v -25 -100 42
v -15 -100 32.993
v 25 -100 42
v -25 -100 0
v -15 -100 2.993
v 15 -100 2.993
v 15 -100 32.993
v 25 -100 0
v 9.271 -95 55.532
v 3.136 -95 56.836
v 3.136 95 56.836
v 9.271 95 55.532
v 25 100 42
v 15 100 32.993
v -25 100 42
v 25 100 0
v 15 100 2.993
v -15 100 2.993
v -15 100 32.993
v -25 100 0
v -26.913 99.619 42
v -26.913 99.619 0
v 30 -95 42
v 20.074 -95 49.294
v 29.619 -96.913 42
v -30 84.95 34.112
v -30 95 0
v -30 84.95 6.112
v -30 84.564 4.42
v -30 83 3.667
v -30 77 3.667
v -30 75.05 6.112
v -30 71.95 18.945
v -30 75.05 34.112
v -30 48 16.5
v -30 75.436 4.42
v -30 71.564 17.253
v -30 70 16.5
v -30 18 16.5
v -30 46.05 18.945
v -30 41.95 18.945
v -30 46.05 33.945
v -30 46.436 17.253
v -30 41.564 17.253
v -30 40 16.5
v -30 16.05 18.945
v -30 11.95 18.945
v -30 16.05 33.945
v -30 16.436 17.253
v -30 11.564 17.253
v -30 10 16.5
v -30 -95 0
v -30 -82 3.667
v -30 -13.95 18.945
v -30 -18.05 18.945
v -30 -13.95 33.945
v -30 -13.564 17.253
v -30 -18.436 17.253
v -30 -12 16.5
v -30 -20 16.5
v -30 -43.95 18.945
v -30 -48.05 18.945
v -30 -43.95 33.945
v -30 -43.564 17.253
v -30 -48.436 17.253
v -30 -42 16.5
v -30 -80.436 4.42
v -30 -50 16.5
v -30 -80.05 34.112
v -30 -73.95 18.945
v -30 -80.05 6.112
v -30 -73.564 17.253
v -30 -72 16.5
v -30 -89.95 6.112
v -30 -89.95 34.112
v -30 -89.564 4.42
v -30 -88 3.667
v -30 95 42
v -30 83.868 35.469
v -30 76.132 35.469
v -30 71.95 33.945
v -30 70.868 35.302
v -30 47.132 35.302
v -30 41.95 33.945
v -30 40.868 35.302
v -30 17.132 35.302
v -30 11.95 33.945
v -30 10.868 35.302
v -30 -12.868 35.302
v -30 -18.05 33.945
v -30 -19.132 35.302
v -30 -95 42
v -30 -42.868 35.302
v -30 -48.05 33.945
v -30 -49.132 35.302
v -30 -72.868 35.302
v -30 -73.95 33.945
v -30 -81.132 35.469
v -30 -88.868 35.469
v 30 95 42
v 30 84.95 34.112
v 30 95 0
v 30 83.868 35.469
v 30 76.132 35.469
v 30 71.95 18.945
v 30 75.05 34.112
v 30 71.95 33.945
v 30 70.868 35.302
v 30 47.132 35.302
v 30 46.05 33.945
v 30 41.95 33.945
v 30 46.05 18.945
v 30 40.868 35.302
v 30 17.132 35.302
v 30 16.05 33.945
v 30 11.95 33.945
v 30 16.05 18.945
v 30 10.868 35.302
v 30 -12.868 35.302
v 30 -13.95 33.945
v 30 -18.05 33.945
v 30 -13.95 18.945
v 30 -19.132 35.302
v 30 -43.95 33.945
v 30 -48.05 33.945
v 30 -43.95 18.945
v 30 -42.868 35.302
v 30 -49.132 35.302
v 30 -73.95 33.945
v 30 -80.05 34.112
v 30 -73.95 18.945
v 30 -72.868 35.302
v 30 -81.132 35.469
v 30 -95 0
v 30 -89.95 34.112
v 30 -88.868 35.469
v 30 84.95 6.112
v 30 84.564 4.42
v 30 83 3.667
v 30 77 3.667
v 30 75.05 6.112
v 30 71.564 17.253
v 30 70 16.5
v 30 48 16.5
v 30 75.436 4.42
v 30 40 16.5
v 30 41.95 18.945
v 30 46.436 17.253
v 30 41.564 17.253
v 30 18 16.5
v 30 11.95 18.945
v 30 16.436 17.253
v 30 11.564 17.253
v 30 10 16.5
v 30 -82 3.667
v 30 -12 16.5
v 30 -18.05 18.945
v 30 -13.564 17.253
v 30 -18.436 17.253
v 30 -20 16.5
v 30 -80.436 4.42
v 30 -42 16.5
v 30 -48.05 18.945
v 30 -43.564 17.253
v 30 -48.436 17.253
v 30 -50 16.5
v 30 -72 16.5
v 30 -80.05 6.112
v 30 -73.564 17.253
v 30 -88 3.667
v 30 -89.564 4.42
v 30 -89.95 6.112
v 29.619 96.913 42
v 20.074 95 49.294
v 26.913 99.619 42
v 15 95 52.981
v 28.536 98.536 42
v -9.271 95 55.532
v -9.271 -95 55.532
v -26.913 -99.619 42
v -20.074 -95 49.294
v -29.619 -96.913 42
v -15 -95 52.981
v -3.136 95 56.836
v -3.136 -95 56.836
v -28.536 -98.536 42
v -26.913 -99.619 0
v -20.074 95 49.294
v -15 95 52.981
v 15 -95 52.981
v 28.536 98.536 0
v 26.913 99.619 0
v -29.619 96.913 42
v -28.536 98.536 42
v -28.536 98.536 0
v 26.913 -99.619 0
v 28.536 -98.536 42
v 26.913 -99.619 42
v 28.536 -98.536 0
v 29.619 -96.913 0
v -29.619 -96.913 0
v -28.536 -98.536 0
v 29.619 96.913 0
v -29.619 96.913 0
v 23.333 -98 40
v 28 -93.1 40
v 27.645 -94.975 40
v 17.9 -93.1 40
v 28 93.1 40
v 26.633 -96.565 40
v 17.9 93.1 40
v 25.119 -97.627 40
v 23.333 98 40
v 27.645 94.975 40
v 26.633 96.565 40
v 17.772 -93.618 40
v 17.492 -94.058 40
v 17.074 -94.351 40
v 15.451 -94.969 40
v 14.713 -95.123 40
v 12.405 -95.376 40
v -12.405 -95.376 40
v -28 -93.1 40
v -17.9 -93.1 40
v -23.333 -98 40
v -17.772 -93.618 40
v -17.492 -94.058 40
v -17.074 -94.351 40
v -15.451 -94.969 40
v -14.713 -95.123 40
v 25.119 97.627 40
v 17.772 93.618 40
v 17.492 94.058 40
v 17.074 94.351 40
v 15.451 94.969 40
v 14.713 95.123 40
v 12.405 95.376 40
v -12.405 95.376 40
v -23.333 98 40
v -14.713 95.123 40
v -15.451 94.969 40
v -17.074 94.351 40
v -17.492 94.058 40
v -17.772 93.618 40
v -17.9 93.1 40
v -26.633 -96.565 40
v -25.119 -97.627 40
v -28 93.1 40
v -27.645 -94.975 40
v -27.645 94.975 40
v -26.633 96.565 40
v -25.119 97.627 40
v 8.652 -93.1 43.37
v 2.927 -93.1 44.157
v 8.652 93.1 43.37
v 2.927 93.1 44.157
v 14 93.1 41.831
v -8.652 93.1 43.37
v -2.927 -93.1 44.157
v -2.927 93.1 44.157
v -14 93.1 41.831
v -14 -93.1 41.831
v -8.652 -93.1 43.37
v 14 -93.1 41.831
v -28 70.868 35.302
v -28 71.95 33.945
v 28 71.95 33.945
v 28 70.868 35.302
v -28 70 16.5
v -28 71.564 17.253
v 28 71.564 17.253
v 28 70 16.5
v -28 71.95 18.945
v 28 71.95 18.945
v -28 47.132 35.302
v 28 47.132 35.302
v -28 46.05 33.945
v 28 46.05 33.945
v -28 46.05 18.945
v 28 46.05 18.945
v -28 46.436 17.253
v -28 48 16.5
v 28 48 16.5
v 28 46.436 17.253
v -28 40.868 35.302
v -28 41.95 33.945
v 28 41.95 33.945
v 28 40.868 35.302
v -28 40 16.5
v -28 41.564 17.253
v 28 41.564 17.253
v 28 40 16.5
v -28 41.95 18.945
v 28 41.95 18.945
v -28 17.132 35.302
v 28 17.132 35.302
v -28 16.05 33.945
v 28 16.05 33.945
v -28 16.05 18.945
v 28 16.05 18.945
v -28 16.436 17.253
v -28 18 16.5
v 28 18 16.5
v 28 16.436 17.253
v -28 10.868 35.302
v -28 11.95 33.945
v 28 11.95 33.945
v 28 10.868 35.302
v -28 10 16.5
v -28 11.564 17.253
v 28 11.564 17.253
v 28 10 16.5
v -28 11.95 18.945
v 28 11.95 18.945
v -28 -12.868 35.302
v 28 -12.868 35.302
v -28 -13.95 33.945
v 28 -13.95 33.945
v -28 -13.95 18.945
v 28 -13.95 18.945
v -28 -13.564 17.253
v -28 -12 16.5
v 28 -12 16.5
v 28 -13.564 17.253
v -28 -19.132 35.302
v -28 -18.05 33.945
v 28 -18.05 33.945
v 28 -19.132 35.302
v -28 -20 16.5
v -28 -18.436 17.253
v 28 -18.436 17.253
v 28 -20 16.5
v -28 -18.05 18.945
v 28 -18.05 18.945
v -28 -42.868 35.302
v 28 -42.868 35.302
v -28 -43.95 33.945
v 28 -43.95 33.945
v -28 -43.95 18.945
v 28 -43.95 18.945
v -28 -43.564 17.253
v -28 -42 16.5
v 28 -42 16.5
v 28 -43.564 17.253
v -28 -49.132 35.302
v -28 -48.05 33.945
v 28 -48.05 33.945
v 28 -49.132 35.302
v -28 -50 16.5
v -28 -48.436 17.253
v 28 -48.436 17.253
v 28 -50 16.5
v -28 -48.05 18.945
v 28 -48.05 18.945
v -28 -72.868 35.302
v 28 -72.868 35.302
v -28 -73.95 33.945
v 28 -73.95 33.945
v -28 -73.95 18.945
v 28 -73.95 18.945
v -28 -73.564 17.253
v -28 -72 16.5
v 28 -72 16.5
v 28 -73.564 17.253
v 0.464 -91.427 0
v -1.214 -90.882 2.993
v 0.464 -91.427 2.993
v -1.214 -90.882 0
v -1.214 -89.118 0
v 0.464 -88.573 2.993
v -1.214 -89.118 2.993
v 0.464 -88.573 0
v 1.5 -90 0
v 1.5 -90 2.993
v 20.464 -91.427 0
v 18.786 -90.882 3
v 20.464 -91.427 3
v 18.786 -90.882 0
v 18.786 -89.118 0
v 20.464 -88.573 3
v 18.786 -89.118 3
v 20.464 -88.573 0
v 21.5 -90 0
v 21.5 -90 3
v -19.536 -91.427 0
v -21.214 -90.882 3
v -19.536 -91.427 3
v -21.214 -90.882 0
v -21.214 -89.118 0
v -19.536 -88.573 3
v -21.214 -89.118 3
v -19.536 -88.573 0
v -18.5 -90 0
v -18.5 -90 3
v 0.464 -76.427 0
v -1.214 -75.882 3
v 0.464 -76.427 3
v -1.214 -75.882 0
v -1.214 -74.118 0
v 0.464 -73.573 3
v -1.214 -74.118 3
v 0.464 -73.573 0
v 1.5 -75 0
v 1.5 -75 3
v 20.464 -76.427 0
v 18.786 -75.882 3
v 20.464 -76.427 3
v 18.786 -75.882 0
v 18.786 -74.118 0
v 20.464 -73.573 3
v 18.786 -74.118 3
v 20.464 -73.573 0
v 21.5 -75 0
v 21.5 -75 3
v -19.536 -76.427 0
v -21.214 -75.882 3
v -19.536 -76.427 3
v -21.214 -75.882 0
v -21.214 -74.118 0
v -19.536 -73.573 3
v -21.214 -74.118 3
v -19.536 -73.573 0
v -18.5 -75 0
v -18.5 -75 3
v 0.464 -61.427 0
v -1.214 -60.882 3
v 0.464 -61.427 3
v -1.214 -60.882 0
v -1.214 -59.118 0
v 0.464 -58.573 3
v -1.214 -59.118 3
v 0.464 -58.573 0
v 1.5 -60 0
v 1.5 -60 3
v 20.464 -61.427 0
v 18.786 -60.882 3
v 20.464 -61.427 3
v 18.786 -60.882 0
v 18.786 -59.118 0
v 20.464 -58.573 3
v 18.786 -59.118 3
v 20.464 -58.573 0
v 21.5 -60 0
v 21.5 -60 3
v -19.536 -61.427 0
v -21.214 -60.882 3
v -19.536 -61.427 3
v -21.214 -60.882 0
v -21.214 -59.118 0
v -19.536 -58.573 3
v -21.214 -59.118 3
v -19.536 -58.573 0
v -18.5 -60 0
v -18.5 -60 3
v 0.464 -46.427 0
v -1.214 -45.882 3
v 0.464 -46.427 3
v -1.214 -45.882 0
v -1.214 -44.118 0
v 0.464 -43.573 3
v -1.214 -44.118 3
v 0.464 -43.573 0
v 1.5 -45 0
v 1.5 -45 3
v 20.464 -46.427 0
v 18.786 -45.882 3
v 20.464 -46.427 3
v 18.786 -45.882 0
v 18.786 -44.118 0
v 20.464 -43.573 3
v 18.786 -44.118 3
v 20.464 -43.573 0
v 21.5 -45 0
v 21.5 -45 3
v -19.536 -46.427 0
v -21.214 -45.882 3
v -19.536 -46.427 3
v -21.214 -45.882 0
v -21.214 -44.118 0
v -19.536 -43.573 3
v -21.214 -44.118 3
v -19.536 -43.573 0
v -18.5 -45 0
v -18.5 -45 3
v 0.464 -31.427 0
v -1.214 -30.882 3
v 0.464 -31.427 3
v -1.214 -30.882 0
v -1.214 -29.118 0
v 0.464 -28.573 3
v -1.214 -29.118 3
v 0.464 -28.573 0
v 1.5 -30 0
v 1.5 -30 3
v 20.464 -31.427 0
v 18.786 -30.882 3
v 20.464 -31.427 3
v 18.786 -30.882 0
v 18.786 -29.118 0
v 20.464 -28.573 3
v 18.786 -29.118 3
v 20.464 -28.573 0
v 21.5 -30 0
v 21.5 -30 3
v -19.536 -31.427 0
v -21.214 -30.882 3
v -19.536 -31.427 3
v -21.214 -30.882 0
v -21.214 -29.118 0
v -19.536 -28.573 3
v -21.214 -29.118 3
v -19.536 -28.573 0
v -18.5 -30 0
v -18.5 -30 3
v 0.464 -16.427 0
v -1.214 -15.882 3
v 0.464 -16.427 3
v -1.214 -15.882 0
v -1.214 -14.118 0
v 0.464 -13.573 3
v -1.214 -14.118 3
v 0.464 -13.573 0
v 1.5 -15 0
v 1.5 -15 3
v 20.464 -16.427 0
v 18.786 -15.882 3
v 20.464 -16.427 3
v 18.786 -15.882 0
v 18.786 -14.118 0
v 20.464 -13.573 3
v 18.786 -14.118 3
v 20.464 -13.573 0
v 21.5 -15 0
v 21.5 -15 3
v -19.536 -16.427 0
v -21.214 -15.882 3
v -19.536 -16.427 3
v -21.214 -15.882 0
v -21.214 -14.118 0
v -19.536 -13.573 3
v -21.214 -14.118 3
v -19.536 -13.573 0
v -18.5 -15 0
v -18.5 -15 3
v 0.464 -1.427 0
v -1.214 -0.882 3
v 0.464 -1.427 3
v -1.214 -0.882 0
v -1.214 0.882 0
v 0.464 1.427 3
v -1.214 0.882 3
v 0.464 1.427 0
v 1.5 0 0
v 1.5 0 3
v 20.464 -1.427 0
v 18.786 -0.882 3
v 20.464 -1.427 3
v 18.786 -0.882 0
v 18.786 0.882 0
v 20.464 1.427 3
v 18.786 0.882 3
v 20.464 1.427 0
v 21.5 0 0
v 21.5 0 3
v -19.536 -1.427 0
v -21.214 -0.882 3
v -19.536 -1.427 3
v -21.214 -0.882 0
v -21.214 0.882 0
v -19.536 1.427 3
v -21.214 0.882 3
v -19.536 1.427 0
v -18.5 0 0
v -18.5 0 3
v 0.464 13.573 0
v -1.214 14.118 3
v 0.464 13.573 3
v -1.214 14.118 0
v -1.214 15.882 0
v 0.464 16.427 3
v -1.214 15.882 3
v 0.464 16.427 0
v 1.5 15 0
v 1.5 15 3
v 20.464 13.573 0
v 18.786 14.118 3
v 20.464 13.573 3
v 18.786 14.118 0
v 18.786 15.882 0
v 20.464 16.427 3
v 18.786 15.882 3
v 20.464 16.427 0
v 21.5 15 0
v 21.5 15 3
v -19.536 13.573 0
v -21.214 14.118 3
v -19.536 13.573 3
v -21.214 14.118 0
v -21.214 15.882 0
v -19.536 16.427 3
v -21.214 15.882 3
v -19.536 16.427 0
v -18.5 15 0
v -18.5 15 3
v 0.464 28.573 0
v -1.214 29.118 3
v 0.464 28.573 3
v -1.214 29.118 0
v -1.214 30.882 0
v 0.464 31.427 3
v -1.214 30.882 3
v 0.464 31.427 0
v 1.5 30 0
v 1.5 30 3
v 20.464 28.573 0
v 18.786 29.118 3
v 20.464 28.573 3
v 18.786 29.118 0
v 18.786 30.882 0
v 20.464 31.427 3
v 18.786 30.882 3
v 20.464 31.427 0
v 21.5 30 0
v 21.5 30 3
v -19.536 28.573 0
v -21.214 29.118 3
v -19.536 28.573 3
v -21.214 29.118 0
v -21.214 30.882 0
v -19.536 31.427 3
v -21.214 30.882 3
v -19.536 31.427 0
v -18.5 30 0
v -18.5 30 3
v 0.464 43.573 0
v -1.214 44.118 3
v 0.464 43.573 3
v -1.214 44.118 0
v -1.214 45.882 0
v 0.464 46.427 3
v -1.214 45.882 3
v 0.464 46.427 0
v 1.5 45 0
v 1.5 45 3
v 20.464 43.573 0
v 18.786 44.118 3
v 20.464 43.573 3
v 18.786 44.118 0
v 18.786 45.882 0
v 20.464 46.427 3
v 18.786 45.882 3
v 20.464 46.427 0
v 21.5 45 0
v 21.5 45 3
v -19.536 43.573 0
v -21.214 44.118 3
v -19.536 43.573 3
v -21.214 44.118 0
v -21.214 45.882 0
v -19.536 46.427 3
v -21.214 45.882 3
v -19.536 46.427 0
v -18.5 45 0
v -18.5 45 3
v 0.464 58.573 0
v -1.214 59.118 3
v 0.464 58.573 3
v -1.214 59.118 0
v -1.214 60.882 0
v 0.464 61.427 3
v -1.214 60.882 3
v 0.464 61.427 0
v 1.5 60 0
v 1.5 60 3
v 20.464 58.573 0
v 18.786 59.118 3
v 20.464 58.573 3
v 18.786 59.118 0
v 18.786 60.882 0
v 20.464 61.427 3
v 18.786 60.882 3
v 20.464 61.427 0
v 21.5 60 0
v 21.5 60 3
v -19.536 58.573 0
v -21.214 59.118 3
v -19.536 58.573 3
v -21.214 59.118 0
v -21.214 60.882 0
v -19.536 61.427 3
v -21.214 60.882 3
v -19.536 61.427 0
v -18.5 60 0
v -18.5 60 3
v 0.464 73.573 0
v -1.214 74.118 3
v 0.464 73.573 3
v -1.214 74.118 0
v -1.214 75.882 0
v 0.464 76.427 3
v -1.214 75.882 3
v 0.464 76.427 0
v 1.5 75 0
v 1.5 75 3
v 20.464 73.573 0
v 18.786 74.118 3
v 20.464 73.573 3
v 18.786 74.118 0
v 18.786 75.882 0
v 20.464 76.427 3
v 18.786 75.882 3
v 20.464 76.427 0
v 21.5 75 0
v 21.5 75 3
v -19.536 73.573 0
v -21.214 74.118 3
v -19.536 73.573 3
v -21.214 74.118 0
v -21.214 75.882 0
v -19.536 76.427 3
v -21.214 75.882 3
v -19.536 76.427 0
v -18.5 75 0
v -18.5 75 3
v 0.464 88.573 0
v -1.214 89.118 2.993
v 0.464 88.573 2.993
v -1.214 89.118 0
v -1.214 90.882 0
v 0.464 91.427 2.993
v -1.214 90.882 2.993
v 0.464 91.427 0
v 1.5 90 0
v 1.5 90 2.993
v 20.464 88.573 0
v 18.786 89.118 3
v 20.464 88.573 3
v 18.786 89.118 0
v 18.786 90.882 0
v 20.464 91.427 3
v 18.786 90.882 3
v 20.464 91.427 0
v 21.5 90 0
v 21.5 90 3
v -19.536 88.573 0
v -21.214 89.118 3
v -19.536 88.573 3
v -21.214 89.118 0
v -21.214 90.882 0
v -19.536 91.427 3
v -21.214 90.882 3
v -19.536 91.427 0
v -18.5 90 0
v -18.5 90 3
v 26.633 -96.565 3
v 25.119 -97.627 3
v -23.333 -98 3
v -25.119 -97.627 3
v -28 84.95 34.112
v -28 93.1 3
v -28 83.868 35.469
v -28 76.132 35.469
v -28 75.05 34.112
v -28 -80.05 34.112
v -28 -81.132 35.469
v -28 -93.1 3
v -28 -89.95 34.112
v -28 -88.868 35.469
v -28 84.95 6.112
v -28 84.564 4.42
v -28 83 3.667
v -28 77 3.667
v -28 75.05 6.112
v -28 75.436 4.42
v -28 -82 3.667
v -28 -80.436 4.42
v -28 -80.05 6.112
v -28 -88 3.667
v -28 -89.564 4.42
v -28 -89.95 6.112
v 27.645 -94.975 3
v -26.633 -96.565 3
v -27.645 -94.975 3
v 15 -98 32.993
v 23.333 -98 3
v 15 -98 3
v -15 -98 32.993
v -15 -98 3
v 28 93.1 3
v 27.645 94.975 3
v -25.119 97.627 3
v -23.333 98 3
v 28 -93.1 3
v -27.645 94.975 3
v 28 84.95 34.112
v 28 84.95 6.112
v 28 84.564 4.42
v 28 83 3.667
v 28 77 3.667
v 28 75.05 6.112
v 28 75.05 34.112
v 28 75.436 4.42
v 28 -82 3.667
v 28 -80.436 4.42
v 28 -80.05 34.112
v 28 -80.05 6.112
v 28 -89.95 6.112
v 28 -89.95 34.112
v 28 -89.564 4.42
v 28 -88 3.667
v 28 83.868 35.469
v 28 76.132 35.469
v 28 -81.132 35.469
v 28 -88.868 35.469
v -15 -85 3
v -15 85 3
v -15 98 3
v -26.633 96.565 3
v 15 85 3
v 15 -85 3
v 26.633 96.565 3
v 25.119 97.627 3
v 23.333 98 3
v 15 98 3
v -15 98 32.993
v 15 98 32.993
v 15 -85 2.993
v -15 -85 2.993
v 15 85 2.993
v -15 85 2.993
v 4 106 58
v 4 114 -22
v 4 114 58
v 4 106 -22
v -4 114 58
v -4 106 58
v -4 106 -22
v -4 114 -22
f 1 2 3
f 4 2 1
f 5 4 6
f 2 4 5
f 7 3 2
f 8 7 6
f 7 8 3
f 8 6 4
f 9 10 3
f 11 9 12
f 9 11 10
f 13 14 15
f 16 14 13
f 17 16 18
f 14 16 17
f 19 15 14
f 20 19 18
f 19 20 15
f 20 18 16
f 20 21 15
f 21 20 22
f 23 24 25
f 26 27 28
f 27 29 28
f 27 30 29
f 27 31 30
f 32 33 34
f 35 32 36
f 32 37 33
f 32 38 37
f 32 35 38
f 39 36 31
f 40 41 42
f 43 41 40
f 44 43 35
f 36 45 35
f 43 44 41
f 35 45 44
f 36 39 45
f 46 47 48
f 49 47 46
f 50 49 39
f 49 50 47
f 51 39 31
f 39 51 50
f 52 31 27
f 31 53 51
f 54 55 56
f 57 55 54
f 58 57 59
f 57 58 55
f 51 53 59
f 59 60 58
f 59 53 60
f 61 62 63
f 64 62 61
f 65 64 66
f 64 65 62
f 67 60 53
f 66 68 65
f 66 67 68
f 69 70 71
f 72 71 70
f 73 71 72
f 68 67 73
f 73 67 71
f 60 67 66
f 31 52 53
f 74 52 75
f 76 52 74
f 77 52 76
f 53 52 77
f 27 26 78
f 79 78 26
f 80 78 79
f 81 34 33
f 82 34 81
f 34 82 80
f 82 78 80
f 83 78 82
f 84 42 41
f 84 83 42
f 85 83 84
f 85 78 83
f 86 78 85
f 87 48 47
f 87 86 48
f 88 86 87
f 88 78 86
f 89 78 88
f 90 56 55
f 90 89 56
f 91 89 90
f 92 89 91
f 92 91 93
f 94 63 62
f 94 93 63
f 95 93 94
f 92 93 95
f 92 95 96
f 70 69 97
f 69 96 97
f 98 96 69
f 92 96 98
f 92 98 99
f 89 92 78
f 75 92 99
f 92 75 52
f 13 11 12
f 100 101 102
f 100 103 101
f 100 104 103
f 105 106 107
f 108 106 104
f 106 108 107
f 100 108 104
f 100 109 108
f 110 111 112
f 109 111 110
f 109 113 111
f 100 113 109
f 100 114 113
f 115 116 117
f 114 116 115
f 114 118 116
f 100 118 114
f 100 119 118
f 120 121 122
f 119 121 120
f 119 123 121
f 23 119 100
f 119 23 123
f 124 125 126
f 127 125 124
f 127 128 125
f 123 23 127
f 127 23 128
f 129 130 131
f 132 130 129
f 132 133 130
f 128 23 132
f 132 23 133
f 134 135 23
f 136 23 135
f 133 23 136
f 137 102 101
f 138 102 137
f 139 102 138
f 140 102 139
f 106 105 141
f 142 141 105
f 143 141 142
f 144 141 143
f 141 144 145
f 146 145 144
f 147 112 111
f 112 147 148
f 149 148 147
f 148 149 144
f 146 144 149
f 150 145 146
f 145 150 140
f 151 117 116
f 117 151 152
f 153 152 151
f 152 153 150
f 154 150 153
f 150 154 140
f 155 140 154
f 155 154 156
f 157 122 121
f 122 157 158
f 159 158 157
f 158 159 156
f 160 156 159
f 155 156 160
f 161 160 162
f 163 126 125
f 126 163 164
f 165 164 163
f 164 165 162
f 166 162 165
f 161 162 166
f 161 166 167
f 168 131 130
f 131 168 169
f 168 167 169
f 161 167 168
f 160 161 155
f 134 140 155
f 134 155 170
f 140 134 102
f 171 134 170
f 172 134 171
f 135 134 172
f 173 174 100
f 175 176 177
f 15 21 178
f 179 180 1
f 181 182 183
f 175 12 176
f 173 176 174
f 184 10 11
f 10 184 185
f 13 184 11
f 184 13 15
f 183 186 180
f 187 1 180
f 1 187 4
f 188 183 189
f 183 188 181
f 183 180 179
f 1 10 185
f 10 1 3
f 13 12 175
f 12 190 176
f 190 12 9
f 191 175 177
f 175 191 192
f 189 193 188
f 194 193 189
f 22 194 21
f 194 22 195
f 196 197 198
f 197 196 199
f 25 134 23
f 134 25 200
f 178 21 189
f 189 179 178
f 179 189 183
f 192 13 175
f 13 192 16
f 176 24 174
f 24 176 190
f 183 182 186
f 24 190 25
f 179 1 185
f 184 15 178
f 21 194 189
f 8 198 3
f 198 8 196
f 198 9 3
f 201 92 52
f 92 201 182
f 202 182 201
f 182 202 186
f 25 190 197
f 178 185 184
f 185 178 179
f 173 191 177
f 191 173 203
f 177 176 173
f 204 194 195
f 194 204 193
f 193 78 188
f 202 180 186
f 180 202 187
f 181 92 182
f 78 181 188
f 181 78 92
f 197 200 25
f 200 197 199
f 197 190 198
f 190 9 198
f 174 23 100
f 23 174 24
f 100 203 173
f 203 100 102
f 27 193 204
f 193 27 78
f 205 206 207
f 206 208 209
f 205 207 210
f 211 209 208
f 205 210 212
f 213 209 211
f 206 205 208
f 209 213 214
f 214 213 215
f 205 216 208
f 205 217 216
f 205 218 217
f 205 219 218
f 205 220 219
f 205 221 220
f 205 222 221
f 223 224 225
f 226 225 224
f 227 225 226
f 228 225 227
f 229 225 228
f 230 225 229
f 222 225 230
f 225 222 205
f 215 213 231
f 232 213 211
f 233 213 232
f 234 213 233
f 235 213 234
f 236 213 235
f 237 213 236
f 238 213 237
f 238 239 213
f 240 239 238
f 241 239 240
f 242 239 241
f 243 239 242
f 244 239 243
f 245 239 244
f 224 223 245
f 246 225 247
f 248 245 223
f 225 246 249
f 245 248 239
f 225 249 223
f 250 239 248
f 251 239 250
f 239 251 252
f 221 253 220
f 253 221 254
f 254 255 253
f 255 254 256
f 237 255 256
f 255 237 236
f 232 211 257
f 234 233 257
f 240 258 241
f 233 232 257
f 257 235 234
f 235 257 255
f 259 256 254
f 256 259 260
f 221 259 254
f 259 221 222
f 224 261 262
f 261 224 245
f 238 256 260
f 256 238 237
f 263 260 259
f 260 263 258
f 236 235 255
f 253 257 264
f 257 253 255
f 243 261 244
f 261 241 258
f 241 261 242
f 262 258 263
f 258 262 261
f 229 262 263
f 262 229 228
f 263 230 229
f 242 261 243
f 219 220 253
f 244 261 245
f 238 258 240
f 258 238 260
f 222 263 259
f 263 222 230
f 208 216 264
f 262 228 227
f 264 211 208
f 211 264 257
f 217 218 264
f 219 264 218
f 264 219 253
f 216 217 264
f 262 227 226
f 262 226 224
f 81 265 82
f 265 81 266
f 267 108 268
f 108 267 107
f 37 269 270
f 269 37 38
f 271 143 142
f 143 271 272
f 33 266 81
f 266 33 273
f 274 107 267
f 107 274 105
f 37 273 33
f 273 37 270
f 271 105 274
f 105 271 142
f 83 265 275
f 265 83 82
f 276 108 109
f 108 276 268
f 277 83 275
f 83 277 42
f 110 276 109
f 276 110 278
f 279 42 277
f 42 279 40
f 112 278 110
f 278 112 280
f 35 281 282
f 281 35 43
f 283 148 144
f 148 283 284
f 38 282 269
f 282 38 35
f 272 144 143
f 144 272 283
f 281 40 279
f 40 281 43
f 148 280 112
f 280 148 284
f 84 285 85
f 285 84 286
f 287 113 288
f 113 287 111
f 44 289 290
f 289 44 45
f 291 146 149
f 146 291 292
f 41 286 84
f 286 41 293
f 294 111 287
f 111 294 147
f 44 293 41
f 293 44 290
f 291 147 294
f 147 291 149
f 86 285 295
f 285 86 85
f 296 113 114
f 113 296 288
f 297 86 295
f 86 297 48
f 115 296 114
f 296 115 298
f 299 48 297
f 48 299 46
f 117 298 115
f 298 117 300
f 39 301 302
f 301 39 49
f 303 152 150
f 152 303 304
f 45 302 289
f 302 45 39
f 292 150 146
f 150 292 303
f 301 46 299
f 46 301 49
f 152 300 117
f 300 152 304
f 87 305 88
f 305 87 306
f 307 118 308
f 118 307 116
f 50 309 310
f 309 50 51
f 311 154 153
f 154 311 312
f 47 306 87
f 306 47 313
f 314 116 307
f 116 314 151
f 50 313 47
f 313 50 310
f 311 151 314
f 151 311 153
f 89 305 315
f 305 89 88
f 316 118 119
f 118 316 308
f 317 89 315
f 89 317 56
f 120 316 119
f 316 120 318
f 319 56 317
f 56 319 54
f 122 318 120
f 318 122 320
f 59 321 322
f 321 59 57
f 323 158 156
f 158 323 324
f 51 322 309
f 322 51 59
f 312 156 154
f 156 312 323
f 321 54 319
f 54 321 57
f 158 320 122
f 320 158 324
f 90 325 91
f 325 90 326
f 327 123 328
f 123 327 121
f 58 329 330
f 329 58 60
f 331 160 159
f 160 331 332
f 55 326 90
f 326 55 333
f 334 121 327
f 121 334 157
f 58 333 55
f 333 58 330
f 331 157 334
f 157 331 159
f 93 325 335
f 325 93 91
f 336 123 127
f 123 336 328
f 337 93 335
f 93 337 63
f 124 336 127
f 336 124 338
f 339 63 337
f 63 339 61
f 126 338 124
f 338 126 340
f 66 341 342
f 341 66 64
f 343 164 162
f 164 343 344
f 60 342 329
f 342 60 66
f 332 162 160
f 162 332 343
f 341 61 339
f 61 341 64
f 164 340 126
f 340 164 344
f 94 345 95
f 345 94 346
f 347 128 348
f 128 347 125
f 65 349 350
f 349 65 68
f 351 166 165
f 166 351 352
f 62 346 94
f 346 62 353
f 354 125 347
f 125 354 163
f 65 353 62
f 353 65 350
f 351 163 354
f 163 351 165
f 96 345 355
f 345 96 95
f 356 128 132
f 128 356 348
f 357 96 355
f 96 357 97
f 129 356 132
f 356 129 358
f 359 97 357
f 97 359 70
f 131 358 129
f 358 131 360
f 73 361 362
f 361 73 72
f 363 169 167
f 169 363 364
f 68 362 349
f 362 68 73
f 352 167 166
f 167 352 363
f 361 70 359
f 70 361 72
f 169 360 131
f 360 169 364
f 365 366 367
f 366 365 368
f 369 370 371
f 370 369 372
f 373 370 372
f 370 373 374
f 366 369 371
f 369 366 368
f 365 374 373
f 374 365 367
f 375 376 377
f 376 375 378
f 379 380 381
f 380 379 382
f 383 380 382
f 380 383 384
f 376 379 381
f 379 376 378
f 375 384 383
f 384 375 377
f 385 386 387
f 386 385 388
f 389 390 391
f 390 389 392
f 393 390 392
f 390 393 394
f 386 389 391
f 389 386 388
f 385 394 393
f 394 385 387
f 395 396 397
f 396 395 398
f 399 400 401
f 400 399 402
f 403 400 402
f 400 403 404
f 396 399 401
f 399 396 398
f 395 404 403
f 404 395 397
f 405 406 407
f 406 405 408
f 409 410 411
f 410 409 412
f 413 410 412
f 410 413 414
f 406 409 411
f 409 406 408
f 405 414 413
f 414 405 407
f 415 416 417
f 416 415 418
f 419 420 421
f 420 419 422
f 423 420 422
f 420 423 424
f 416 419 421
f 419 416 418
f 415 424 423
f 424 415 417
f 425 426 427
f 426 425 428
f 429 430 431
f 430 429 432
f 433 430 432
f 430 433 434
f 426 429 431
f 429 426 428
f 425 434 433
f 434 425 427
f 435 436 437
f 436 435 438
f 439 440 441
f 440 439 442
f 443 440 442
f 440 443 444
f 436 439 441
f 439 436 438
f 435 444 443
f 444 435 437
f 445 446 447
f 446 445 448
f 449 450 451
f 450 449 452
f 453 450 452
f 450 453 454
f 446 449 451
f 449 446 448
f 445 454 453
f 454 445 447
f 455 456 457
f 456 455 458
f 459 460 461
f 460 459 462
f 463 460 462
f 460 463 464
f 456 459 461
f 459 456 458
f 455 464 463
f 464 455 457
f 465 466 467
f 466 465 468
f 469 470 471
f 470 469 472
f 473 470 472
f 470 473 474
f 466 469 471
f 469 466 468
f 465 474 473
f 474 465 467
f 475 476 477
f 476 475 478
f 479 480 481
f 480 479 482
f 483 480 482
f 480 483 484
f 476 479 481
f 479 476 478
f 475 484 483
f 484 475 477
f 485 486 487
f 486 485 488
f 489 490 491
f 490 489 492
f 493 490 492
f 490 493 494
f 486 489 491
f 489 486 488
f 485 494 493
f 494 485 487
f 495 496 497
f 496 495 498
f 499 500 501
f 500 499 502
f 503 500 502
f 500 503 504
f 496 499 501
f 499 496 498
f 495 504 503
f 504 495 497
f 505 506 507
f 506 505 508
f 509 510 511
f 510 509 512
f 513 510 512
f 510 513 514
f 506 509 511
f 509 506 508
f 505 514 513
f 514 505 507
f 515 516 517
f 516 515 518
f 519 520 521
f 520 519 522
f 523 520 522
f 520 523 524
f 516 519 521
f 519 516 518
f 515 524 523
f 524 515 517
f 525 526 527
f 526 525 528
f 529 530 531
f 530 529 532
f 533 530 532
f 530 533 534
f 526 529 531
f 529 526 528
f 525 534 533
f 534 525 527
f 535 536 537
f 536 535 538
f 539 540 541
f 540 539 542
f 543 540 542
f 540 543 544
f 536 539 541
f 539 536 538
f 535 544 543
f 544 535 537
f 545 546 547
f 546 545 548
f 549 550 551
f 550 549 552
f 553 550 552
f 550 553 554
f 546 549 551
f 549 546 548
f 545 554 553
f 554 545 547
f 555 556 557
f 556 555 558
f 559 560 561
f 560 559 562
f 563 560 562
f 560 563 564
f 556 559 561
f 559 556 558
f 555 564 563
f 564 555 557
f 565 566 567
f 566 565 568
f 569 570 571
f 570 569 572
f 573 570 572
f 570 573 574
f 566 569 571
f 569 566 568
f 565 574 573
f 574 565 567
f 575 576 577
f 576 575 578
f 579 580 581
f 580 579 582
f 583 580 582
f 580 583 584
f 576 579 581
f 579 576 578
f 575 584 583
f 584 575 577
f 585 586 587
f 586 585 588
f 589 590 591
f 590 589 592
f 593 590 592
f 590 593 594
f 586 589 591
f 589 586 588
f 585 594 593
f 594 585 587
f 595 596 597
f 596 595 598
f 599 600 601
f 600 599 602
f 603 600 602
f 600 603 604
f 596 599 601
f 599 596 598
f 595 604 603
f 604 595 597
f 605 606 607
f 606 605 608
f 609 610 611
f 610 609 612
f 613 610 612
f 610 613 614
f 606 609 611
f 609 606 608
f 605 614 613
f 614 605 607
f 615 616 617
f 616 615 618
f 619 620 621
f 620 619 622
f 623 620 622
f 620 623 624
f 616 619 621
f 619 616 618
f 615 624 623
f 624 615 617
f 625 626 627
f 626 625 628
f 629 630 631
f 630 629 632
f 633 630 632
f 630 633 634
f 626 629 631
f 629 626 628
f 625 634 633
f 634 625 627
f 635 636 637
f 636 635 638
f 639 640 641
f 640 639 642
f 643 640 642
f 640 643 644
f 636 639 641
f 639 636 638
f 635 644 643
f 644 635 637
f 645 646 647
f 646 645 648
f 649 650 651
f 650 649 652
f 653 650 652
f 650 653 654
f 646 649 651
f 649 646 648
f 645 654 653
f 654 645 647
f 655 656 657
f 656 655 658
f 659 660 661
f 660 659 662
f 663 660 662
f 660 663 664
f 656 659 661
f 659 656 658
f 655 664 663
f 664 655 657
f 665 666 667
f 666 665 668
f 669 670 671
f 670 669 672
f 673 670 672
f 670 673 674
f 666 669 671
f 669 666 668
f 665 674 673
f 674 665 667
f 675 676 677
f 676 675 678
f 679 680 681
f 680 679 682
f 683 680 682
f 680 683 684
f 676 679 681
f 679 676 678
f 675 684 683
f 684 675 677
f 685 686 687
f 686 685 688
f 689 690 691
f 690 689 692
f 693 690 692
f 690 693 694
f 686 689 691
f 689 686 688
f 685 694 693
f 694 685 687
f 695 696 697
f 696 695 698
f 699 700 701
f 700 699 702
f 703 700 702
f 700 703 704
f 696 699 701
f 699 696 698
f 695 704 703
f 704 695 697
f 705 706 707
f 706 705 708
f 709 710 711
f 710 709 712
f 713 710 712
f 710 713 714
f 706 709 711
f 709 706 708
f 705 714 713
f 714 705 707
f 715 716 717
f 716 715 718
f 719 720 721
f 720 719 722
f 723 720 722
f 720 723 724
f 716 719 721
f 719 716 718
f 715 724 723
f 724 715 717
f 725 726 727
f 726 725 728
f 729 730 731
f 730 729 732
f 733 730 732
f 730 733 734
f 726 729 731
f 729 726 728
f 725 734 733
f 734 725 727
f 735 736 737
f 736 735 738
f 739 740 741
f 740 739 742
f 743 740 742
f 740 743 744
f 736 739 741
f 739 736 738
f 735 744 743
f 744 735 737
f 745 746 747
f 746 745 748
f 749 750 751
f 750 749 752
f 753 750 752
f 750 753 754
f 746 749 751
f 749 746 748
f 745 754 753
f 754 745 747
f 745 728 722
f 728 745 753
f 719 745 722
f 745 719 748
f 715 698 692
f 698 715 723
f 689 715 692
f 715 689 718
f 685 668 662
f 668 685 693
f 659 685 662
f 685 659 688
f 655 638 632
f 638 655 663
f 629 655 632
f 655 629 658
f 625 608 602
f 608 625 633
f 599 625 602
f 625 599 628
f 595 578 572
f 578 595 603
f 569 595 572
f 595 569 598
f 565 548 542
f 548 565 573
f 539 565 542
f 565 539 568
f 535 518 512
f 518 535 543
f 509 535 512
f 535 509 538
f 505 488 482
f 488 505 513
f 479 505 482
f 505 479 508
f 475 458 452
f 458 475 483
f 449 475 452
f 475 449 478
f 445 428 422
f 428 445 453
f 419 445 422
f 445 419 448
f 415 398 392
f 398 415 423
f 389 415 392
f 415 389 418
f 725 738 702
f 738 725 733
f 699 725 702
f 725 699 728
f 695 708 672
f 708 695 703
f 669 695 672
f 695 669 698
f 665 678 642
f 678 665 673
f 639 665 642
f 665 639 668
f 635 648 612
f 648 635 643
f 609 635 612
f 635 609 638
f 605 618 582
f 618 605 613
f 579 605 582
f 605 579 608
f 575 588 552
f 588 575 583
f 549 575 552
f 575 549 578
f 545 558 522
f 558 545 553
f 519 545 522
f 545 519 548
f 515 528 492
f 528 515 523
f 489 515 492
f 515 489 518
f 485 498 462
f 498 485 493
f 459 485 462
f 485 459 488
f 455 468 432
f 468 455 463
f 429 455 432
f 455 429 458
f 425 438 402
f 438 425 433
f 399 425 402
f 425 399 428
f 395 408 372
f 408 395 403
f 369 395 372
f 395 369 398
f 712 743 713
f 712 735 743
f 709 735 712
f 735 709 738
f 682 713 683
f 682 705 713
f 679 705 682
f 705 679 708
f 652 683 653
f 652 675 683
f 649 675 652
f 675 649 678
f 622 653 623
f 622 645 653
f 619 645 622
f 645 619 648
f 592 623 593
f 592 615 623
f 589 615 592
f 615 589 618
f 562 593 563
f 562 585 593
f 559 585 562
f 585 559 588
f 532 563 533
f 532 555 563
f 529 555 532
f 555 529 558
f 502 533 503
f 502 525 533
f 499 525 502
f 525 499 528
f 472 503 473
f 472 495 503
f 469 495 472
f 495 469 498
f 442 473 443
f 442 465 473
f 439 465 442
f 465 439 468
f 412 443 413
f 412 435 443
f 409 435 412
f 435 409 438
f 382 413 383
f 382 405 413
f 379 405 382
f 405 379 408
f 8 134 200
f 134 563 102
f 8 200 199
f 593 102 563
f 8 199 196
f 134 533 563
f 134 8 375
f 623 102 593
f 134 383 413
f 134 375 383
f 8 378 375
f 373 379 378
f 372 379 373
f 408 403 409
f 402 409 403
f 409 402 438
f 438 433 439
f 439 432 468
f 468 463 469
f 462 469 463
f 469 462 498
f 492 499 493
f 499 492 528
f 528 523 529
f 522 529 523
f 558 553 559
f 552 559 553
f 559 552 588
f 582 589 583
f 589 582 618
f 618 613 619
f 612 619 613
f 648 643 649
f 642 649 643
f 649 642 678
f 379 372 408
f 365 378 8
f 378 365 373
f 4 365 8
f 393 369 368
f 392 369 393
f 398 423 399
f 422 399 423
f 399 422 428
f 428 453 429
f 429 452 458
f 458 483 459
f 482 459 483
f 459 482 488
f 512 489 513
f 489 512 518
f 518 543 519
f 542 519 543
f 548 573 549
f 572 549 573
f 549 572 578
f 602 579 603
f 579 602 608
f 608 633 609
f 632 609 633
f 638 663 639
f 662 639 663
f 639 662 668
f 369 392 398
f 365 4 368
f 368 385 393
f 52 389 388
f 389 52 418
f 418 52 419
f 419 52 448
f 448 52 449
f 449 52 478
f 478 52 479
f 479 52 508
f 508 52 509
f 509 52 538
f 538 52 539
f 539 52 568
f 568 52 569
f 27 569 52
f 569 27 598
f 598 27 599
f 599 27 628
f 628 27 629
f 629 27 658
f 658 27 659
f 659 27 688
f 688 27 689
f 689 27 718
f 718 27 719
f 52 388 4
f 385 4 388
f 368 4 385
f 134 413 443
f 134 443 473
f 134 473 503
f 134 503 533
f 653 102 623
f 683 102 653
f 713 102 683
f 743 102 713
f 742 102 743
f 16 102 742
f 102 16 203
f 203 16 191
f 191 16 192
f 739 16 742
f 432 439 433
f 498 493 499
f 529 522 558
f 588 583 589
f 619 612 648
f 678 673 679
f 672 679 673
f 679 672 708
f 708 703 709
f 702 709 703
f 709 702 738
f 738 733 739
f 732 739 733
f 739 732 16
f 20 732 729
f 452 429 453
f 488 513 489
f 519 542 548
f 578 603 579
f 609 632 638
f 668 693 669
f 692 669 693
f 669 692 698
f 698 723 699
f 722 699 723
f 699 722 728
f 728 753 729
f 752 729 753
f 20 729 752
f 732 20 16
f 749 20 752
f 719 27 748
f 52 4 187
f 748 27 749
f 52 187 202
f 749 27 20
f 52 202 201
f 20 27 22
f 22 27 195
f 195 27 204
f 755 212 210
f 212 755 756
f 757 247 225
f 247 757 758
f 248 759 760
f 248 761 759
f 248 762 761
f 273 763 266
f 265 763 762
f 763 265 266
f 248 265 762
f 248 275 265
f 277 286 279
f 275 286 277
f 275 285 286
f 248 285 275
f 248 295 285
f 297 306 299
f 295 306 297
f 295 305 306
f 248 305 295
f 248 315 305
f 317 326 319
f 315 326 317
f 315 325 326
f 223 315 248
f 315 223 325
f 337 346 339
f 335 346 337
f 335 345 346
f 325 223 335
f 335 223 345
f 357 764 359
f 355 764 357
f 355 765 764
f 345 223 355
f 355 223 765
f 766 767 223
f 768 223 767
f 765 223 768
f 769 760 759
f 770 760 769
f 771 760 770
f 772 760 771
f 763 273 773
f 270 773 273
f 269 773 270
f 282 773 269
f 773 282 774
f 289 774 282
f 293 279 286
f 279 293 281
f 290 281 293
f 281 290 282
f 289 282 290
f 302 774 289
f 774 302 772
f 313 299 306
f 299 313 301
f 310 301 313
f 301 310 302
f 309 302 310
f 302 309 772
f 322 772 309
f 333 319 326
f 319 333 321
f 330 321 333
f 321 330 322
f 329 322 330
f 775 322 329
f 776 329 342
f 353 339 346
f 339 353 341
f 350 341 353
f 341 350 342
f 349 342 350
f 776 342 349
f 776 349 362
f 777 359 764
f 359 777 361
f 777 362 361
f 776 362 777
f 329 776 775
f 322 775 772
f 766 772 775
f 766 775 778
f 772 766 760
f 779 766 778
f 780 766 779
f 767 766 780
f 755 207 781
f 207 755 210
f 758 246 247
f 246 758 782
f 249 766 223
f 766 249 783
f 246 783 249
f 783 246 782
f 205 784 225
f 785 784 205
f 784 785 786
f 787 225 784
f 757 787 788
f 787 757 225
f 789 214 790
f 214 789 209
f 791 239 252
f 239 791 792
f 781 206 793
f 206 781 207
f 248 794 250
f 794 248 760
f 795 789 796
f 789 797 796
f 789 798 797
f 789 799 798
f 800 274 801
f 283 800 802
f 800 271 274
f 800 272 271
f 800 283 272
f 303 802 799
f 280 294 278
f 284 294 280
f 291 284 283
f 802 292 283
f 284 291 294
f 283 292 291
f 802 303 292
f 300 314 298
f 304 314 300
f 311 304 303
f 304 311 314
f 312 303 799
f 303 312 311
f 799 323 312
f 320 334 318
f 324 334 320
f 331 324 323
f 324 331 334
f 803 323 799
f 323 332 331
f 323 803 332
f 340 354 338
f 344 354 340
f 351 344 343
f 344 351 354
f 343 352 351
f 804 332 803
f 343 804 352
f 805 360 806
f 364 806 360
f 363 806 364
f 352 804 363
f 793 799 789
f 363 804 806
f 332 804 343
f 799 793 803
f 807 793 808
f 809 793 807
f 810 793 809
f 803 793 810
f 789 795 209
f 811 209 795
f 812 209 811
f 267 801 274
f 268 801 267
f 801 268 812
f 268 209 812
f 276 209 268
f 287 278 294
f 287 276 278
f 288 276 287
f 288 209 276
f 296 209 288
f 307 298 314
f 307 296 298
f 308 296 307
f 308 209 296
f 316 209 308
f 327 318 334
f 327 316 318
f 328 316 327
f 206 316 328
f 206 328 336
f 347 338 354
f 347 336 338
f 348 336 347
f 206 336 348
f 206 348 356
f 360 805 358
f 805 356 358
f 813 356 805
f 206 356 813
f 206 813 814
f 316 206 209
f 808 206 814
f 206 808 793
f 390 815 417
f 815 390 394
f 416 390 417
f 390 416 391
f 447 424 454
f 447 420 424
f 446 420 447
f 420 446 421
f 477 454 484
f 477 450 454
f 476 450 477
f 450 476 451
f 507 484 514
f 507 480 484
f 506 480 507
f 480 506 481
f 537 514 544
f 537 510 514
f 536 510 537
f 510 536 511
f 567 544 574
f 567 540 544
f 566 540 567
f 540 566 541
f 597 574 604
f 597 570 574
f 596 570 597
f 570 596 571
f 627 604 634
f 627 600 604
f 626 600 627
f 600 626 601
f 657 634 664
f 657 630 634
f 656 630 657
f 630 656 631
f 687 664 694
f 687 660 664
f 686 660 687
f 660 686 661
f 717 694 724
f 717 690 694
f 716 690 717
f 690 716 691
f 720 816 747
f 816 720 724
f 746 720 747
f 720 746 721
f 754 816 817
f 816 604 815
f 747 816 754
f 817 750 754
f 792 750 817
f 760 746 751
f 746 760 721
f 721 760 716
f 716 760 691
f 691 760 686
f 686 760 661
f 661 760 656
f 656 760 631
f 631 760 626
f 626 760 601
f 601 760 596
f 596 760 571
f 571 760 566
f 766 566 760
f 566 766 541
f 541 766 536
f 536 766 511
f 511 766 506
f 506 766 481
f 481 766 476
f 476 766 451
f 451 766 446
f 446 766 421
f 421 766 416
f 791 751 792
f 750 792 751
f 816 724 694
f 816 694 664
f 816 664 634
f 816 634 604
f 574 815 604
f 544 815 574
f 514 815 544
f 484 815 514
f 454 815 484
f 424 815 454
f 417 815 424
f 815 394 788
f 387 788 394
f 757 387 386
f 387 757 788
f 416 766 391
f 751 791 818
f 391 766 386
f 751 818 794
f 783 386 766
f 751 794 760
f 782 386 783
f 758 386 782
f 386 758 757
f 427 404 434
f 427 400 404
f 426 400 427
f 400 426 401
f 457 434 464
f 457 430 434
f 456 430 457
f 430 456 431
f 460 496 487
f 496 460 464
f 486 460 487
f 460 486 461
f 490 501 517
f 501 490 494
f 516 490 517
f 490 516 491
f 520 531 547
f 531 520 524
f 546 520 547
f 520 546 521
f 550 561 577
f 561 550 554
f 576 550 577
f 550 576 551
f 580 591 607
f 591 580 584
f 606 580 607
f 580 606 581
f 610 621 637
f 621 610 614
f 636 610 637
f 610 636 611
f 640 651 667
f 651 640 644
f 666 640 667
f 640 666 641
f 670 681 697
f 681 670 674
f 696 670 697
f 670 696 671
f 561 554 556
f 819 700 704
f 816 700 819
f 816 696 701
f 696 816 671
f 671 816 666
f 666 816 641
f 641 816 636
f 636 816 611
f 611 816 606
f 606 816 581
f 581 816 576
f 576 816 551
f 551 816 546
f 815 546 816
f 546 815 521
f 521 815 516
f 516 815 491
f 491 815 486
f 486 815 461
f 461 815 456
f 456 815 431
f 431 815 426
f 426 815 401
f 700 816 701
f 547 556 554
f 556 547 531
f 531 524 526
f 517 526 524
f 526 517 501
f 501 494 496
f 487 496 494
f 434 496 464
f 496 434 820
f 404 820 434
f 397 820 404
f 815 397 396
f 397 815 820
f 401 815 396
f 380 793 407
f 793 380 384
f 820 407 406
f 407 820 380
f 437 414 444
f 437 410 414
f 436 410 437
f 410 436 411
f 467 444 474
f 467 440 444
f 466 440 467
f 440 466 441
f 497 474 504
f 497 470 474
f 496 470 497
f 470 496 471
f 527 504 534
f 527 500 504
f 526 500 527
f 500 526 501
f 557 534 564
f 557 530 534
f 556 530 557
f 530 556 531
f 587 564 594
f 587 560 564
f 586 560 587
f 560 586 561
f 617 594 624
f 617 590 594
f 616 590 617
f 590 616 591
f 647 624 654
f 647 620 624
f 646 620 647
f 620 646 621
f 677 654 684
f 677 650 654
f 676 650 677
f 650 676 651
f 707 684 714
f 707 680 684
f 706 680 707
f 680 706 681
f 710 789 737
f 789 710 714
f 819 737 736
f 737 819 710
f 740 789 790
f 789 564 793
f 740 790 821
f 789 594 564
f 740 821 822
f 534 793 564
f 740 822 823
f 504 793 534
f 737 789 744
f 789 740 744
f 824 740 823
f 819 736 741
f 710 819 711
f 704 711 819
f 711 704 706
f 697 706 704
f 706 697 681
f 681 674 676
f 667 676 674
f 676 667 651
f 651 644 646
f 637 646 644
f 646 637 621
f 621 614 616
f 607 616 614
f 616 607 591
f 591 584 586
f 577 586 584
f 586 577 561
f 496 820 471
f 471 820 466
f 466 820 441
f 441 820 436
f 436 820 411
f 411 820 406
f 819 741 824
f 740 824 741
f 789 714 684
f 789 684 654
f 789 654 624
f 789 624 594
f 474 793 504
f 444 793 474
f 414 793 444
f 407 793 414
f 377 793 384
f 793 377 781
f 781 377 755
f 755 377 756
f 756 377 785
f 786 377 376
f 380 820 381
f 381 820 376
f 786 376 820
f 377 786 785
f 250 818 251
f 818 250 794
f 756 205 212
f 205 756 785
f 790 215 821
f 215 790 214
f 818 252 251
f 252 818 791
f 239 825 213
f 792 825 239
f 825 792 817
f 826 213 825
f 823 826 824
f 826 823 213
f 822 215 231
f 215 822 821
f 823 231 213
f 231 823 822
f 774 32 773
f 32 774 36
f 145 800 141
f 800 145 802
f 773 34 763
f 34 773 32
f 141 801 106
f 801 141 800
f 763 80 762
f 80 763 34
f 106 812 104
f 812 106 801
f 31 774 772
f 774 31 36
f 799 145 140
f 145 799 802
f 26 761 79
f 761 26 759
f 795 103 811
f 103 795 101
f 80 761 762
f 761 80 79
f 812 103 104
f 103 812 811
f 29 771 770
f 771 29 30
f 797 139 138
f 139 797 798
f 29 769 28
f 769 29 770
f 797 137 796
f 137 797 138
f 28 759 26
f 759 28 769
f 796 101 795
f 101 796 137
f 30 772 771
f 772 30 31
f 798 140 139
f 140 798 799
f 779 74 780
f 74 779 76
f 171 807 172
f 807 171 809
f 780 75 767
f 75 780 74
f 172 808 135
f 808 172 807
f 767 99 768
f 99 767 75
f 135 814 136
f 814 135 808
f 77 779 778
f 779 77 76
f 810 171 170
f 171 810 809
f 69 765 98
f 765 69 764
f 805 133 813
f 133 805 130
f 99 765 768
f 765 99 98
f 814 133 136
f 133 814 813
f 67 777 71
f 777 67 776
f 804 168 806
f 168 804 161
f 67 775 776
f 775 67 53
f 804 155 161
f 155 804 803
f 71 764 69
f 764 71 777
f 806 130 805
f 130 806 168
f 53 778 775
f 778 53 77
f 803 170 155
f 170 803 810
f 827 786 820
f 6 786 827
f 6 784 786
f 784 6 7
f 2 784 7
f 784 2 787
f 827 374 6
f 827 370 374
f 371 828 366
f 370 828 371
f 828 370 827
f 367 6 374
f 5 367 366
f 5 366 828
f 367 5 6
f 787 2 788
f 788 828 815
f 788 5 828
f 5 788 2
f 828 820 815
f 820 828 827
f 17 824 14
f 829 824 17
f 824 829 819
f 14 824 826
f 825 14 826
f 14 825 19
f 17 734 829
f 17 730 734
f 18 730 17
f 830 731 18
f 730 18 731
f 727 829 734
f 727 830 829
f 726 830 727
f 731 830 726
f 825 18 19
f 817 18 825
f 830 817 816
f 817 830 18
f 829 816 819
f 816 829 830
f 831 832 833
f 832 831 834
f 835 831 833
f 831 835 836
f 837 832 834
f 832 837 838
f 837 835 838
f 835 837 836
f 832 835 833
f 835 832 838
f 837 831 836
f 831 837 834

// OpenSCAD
// Wagon

/* [Eisenbahnwagon Komponentenauswahl] */
Wagon = true;
Dach = true;
Raeder = false;

/* [Eisenbahnwagon Konstruktionsparameter] */
// [Wagonbreite in mm]
Wagonbreite = 60;
// [Wagonlaenge in mm]
Wagonlaenge = 200;
// [Wagonhoehe in mm]
Wagonhoehe = 40;


if (Dach) Dach();
if (Wagon) color("LimeGreen") Wagon();
if (Raeder) color("darkgray") Raeder();

   
 color("black") translate([0,110,40-22]) cube([8,8,80], center = true);
    
module Wagon() {
    wbh = Wagonbreite/2;
    wlh = Wagonlaenge/2;

    difference() {
        Wagonkoerper();
        translate([0,0,3])
        resize([Wagonbreite - 4, Wagonlaenge - 4, Wagonhoehe]) Wagonkoerper();
        
        // Fenster
        for (a =[(Wagonlaenge/2) - 33:-30:(-Wagonlaenge/2) + 35]){
            translate([0,a,0])
            Fenster();
        }  
        
        // Türen
        translate([0,wlh-20,0])
        tuer();
        translate([0,-wlh+15,0])
        tuer();
        
        //Seitentüren
        translate([0,-wlh,Wagonhoehe/3+4.66])
        cube([Wagonbreite-30,30, Wagonhoehe-10], center = true);
        translate([0,wlh,Wagonhoehe/3+4.66])
        cube([Wagonbreite-30,30, Wagonhoehe-10], center = true);
        
        
        // Bodenlöcher
        for (a =[-Wagonlaenge/2+10:15:Wagonlaenge/2]){
            translate([0,a,0])
            Bodenloch();
            translate([20,a,0])
            Bodenloch();
            translate([-20,a,0])
            Bodenloch();
        }  
        
    }
}

module Dach() {
    wbh = Wagonbreite/2;
    wlh = Wagonlaenge/2;
    color("white")
    translate([0,0,0])
    translate([0,0,Wagonhoehe])
    difference() {
        Dachkoerper();
        translate([-wbh-10,-wlh-10,-45])
        cube([Wagonbreite+20,Wagonlaenge+20,45]);

        translate([0,0,-6])
        resize([Wagonbreite - 4, Wagonlaenge - 4, Wagonhoehe - 4]) Dachkoerper();
       
    }
}
 
module Wagonkoerper() {
    
    
    wbh = (Wagonbreite - 10) /2;
    wlh = (Wagonlaenge - 10) /2;
    
    hull() {
        translate([wbh,-wlh,0])
        cylinder(d=10, h=Wagonhoehe);
        translate([-wbh,-wlh,0])
        cylinder(d=10, h=Wagonhoehe);
        
        translate([wbh,wlh,0])
        cylinder(d=10, h=Wagonhoehe);
        translate([-wbh,wlh,0])
        cylinder(d=10, h=Wagonhoehe);
    }
}


module Dachkoerper() {
    
    wbh = (Wagonbreite - 10) /2;
    wlh = (Wagonlaenge - 10) /2;
    
    hull() {
        translate([wbh,-wlh,0])
        cylinder(d=10, h=2);
        translate([-wbh,-wlh,0])
        cylinder(d=10, h=2);
        
        translate([wbh,wlh,0])
        cylinder(d=10, h=2);
        translate([-wbh,wlh,0])
        cylinder(d=10, h=2);
        
        rotate([90,0,0])
        translate([0,-13,0])
        cylinder(d=Wagonbreite, h=Wagonlaenge-10, center = true);
        
    }
}

module Fenster() {
        fb = 22;
        fbh = fb/2;
        fo = 26;
        fh = 15;
        fhh = fh/2;
        translate([0,3,fo])
        hull() {
            rotate([0,90,0])
            translate([-fhh,0,0])
            cylinder(d=4, h= Wagonbreite+20, center = true);
            rotate([0,90,0])
            translate([-fhh,-fb,0])
            cylinder(d=4, h= Wagonbreite+20, center = true);
            rotate([0,90,0])
            translate([fhh,0,0])
            cylinder(d=4, h= Wagonbreite+20, center = true);
            rotate([0,90,0])
            translate([fhh,-fb,0])
            cylinder(d=4, h= Wagonbreite+20, center = true);
        }
}
   
module tuer () {
        tb = 20-8;
        tbh = tb/2;
        th = Wagonhoehe/3*2-15;
        translate([0,3,th])
        hull() {
            rotate([0,90,0])
            translate([tbh,0,0])
            cylinder(d=4, h= Wagonbreite+20, center = true);
            rotate([0,90,0])
            translate([-22,0,0])
            cylinder(d=4, h= Wagonbreite+20, center = true);
            rotate([0,90,0])
            translate([tbh,-tbh,0])
            cylinder(d=4, h= Wagonbreite+20, center = true);
            rotate([0,90,0])
            translate([-22,-tbh,0])
            cylinder(d=4, h= Wagonbreite+20, center = true);
        }
    
}


module Bodenloch() {
    cylinder(d=3, h=Wagonhoehe, center=true);
}



module rad() {

    $fn = 60;
    rh = 4;         
    sh = 1;
    rd = 20.0;
    sd = 24.0;

    
    // Radreifen
    translate([0,0,-sd/2-1])
    rotate([0,90,0])
    union() {
        difference() {
            union() {
                cylinder(h=rh, d=rd);
                cylinder(h=sh, d=sd);
            }
            translate([0,0,-0.5])
            cylinder(h=rh+1, d=rd-5);
        }
        
        // Speichen
        difference() {
            union() {
                cylinder(h=rh, d=12);
            
                for (i = [0:45:360]) {
                    rotate([i,90,0])
                    translate([-rh,-1,0])
                    cube([rh,2,rd/2]);
                }
            
            }
            translate([0,0,-0.5])
            cylinder(h=rh+1, d=2.5);
                   
            
            translate([0,0,-2])
            translate([0,0,-0.5])
            cylinder(h=rh+1, d=6.5);
                   
        }
        translate([2.25,-4,0])
        cube([3,7,rh]);
        
        translate([-5.25,-4,0])
        cube([3,7,rh]);
    }
}

module Raeder() {
    
    // Spurbreitehälfte
    sbh=38/2;
/*     
    translate([sbh,80,0])
    rad();
    translate([-sbh,80,0])
    rotate([0,0,180])
    rad();
*/   
    translate([sbh,55,0])
    rad();
    translate([-sbh,55,0])
    rotate([0,0,180])
    rad();
/*     
    translate([sbh,-80,0])
    rad();
    translate([-sbh,-80,0])
    rotate([0,0,180])
    rad();
*/    
    translate([sbh,-55,0])
    rad();
    translate([-sbh,-55,0])
    rotate([0,0,180])
    rad();
   
    
} 
